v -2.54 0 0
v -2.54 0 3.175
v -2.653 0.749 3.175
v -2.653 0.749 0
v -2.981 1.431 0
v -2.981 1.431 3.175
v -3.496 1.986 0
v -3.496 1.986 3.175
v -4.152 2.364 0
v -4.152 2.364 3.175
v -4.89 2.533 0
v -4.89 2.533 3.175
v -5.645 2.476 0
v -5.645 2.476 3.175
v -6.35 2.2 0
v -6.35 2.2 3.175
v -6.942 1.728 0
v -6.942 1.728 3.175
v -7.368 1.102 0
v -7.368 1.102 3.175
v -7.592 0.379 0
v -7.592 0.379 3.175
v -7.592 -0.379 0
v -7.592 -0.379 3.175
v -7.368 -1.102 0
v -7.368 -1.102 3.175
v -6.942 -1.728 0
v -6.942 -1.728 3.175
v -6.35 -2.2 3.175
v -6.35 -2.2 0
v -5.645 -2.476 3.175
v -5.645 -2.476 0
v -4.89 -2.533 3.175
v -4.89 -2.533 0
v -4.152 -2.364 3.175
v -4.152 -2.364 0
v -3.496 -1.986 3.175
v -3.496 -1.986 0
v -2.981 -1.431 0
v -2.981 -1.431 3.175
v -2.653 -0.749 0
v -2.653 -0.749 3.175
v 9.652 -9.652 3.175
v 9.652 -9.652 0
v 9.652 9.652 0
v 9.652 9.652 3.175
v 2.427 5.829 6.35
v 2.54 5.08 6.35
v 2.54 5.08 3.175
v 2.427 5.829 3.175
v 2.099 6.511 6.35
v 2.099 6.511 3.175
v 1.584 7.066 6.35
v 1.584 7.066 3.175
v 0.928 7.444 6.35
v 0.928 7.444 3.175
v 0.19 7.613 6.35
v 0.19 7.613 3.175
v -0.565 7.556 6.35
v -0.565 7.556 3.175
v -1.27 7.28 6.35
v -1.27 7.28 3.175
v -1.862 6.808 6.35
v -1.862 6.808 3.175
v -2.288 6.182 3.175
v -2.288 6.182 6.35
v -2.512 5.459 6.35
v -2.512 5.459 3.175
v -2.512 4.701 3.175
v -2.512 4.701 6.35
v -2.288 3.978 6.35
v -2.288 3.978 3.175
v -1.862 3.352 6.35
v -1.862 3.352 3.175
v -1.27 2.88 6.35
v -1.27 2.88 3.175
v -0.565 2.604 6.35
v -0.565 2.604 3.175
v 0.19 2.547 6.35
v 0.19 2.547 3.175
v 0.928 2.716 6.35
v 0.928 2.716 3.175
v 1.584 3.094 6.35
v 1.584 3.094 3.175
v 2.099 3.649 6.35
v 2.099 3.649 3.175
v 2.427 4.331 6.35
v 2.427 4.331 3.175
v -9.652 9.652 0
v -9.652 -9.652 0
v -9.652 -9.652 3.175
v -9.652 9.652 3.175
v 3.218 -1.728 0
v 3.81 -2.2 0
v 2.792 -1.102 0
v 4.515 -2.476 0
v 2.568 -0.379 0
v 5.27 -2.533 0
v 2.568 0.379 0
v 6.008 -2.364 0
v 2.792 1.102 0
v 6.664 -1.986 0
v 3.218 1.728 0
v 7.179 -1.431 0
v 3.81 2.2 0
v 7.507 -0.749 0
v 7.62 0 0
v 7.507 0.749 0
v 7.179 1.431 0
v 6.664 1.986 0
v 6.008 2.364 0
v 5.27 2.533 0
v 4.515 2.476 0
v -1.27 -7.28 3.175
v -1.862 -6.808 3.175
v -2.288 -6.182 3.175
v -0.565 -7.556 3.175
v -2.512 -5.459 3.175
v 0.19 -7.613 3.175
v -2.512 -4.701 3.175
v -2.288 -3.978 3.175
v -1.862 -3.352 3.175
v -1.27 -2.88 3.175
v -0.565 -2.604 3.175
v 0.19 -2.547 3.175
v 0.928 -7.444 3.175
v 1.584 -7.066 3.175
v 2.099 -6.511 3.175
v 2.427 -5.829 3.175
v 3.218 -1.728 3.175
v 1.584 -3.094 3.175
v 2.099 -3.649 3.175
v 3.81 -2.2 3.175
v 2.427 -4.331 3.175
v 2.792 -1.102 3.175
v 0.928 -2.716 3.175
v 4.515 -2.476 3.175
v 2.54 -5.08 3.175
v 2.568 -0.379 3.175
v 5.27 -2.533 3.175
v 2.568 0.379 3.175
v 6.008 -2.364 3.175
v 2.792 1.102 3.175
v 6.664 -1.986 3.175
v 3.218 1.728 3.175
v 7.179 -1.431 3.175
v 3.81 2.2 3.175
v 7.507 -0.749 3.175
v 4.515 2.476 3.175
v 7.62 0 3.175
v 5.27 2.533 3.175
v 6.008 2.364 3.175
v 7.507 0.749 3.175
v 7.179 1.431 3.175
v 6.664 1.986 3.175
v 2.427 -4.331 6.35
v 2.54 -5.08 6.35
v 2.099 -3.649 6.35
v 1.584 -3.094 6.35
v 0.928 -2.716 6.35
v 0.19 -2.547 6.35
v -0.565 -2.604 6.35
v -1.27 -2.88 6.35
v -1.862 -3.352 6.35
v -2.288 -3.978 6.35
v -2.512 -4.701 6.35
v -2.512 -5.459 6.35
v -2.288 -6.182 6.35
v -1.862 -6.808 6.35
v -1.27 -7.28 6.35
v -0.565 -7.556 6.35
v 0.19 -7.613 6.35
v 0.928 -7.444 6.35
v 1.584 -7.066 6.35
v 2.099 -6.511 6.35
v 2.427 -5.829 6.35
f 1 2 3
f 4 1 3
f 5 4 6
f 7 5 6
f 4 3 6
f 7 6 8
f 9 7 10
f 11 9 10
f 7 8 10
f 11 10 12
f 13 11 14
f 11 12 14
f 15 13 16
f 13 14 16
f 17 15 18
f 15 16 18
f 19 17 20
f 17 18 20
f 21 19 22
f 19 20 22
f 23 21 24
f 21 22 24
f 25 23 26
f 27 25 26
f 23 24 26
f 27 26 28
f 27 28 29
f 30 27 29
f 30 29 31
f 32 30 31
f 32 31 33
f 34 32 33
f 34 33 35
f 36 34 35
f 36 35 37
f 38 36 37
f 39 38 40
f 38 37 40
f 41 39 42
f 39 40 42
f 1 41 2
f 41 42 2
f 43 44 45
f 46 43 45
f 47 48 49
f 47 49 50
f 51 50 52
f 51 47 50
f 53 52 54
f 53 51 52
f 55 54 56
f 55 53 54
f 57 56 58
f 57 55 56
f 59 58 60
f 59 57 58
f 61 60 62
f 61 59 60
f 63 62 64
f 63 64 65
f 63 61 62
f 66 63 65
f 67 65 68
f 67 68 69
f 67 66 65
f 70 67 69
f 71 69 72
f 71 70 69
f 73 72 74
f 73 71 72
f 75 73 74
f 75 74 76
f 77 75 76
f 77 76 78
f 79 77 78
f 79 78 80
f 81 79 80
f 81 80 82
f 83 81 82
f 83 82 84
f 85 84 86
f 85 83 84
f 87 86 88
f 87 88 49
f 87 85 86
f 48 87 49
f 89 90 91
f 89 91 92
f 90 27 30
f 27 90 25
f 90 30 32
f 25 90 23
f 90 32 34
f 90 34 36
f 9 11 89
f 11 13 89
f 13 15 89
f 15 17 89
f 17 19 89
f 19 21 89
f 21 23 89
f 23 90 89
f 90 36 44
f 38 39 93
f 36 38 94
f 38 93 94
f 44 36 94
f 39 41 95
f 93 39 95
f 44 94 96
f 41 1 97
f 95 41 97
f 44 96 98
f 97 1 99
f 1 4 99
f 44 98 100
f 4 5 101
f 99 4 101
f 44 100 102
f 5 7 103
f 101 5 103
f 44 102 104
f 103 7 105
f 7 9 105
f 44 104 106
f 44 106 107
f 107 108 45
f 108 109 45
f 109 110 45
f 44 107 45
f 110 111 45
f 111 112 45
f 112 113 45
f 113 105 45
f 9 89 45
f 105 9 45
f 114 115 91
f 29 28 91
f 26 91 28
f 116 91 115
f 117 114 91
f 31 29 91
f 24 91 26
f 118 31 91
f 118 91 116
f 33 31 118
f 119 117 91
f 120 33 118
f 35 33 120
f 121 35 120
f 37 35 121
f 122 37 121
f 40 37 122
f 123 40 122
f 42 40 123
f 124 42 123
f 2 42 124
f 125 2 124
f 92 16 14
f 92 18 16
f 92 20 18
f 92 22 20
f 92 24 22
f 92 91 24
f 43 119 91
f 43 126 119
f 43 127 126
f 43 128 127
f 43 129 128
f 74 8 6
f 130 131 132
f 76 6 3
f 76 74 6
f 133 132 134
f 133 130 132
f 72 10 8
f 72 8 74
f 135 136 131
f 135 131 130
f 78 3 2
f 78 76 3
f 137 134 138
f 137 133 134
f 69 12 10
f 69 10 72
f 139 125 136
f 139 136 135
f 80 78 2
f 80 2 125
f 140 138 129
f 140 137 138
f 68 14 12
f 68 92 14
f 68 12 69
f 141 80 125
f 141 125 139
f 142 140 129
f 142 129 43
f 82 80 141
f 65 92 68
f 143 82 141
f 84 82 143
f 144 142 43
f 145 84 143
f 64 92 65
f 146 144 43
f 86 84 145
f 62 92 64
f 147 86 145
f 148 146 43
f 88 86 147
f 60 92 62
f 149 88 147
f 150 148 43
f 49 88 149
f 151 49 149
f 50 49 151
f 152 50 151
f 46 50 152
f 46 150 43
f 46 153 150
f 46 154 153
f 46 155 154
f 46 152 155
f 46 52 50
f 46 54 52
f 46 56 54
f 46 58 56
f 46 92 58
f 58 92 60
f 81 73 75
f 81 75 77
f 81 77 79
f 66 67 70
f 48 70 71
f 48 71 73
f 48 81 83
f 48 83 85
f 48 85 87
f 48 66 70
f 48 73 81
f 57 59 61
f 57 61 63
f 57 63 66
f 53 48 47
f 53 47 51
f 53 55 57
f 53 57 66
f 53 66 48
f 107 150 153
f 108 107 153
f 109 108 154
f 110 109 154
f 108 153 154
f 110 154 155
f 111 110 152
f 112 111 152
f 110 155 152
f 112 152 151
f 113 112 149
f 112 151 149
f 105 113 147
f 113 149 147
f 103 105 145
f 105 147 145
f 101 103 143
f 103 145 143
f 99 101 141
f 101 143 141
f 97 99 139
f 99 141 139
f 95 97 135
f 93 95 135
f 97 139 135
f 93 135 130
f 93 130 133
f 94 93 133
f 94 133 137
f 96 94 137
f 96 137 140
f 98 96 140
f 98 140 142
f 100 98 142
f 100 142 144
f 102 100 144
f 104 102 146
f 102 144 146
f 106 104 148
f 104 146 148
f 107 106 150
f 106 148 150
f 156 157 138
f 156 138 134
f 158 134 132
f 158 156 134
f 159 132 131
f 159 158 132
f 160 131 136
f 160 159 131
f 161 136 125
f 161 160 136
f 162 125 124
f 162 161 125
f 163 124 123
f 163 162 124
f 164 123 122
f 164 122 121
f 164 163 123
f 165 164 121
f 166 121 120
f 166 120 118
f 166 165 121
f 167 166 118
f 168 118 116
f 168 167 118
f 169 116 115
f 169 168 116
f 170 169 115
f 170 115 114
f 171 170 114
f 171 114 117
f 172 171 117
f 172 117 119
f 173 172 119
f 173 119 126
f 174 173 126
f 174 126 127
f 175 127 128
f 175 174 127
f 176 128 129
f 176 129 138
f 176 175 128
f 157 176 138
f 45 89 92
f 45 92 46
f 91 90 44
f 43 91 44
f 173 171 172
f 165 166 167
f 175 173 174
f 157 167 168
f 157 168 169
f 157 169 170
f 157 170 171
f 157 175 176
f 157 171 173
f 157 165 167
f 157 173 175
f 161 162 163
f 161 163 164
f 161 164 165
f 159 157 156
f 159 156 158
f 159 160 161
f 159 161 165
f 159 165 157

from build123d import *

# Parameters (mm, degrees)
F0_W     = 19.304
F0_H     = 19.304
F1_DEPTH = 6.35
F2_W     = 19.304
F2_H     = 19.304
F2_R     = 2.54
F3_DEPTH = 3.175
F4_R     = 2.54
F5_DEPTH = 3.175


with BuildPart() as f1:
    # F0 (on Top) → F1 (new body)
    with BuildSketch(Plane.XY):
        Rectangle(F0_W, F0_H)
    extrude(amount=F1_DEPTH)

    # F2 (on face) → F3 (cut)
    with BuildSketch(Plane.XY.offset(6.35)):
        Rectangle(F2_W, F2_H)
        with Locations((0, -5.08)):
            Circle(F2_R, mode=Mode.SUBTRACT)
        with Locations((0, 5.08)):
            Circle(F2_R, mode=Mode.SUBTRACT)
    extrude(amount=-F3_DEPTH, mode=Mode.SUBTRACT)

    # F4 (on face) → F5 (cut)
    with BuildSketch(Plane.XY.offset(3.175)):
        with Locations((5.08, 0)):
            Circle(F4_R)
        with Locations((-5.08, 0)):
            Circle(F4_R)
    extrude(amount=-F5_DEPTH, mode=Mode.SUBTRACT)


solid = f1.part
